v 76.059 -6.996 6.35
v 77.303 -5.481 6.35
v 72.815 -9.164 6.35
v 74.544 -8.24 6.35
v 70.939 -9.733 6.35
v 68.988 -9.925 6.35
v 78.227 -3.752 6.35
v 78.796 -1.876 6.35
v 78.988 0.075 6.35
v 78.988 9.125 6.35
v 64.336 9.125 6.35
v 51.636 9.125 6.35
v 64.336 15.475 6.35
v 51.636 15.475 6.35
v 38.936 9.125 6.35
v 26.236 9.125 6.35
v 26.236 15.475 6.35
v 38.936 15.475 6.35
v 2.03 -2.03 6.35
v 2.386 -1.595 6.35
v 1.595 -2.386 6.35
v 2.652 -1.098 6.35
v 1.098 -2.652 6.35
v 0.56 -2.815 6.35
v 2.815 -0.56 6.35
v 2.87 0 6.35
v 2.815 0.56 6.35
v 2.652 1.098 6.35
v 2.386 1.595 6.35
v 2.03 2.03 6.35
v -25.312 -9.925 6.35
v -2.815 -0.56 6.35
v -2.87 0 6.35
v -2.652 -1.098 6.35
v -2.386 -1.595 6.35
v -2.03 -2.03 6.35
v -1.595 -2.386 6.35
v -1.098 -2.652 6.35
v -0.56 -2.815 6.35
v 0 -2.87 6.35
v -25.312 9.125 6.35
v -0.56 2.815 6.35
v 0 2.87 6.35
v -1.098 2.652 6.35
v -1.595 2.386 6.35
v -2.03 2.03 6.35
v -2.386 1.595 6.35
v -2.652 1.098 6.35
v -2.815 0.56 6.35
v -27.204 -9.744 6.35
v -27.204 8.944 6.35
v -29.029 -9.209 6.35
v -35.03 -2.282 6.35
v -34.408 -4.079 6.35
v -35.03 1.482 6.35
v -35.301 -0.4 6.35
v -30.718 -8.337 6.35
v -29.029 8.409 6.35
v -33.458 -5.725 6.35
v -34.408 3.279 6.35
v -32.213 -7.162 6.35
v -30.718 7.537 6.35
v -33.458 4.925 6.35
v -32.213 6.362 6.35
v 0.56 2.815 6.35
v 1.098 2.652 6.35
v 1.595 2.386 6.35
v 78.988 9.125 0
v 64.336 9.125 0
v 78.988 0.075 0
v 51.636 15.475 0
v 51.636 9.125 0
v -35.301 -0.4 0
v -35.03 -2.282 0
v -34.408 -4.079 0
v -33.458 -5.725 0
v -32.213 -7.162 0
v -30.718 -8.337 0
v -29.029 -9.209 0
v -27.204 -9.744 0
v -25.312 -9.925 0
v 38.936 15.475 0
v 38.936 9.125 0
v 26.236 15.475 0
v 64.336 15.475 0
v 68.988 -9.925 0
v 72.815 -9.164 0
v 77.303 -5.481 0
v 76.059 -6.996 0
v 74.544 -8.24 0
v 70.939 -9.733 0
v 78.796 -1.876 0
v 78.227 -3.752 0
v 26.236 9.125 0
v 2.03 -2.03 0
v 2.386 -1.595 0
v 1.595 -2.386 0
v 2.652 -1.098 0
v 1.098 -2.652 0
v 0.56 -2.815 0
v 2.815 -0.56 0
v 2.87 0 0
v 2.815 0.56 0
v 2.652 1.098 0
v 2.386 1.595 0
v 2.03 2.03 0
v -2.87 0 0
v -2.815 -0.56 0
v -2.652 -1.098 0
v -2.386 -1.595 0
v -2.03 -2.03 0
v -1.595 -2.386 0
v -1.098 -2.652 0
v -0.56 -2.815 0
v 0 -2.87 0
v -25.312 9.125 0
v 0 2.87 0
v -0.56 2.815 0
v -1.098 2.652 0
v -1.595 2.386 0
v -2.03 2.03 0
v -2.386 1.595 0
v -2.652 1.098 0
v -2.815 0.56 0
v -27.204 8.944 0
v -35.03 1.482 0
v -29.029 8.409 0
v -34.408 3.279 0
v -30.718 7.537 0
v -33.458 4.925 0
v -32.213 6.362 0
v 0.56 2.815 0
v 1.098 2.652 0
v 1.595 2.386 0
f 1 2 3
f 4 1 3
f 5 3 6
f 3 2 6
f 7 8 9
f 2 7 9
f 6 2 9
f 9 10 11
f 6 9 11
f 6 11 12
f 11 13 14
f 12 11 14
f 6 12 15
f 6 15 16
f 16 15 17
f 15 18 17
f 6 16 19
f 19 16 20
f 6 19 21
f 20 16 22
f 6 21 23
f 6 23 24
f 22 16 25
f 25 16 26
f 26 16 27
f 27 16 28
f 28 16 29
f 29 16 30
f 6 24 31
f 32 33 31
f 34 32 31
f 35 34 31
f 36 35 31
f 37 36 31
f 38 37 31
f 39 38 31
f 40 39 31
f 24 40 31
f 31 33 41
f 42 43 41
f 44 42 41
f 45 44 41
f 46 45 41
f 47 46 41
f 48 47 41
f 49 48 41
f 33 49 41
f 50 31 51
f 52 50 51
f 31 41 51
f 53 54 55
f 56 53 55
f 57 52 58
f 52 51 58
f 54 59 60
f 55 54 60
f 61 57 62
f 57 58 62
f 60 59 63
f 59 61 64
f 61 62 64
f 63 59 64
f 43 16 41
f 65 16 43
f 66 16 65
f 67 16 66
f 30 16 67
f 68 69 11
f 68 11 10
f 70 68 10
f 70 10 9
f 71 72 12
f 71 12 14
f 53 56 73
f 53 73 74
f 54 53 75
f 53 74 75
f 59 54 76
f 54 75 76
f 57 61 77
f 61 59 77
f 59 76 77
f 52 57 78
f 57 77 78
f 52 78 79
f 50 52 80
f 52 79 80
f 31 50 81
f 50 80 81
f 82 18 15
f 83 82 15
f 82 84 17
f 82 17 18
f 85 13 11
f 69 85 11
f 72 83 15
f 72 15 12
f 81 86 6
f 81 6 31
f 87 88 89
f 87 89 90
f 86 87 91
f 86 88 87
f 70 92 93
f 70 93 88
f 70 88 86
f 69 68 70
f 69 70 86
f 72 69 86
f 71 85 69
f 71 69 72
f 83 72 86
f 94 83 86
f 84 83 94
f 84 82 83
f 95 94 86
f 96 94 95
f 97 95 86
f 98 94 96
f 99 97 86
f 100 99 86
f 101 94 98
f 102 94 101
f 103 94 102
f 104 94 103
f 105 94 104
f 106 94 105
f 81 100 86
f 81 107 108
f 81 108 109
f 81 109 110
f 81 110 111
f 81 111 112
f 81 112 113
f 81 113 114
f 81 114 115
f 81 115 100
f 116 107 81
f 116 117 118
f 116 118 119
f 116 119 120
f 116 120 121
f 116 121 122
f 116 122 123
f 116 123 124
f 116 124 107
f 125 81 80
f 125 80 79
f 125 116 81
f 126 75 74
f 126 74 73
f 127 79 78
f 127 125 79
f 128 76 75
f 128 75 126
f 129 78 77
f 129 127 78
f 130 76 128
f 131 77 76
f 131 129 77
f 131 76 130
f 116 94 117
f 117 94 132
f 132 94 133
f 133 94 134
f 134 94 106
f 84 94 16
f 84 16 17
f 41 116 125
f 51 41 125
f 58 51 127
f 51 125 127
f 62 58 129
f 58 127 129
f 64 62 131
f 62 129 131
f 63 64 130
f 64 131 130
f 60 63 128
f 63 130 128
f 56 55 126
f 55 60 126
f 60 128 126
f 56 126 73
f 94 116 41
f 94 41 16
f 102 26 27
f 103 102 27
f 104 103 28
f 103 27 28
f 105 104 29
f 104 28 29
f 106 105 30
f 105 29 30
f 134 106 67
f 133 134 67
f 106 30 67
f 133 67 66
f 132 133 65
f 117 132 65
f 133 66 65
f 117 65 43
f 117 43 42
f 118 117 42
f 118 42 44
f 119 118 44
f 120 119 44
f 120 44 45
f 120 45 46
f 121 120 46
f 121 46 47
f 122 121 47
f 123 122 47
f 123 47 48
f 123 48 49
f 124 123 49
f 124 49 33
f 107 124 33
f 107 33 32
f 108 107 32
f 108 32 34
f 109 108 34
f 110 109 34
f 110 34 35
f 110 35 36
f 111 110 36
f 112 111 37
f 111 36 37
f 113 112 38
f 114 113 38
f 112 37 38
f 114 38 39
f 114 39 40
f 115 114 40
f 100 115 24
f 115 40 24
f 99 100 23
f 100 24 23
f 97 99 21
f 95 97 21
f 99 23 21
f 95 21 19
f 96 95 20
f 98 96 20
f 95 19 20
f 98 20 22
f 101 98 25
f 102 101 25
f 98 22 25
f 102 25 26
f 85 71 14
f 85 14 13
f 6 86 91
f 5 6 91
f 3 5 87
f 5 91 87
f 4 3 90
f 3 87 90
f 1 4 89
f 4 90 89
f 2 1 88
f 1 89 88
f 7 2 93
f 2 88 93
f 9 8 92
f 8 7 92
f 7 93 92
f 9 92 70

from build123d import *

# Parameters (mm, degrees)
BOSS_EXTRUDE1_DEPTH = 6.35
FILLET1_R           = 10
SKETCH2_R           = 2.8702
CUT_EXTRUDE1_DEPTH  = 81.739915371


with BuildPart() as part:
    # Sketch1 → Boss-Extrude1 (new body)
    with BuildSketch(Plane.XY):
        Polygon((26.235565231, 15.475), (38.935565231, 15.475), (38.935565231, 9.125), (51.635565231, 9.125), (51.635565231, 15.475), (64.335565231, 15.475), (64.335565231, 9.125), (78.988200442, 9.125), (78.988200442, -9.925), (-35.311799558, -9.925), (-35.311799558, 9.125), (26.235565231, 9.125), align=None)
    extrude(amount=BOSS_EXTRUDE1_DEPTH)

    # Fillet1
    # the kernel refuses this fillet: 10 mm, written as the material it takes off along each edge
    with BuildSketch(Plane(origin=(78.988200442, -9.925, -25), x_dir=(0, 1, 0), z_dir=(0, 0, 1)), Plane(origin=(-35.311799558, 9.125, -25), x_dir=(0, -1, 0), z_dir=(0, 0, 1)), Plane(origin=(-35.311799558, -9.925, -25), x_dir=(1, 0, 0), z_dir=(0, 0, 1))) as fillet1_piece_1:
        with BuildLine():
            CenterArc((FILLET1_R, FILLET1_R), FILLET1_R, 180, 90)
            Line((0, FILLET1_R), (0, 0))
            Line((0, 0), (FILLET1_R, 0))
        make_face()
    extrude(amount=56.35, mode=Mode.SUBTRACT)

    # Sketch2 → Cut-Extrude1 (cut, through all)
    with BuildSketch(Plane.XY.offset(6.35)):
        Circle(SKETCH2_R)
    extrude(amount=-CUT_EXTRUDE1_DEPTH, mode=Mode.SUBTRACT)


solid = part.part
